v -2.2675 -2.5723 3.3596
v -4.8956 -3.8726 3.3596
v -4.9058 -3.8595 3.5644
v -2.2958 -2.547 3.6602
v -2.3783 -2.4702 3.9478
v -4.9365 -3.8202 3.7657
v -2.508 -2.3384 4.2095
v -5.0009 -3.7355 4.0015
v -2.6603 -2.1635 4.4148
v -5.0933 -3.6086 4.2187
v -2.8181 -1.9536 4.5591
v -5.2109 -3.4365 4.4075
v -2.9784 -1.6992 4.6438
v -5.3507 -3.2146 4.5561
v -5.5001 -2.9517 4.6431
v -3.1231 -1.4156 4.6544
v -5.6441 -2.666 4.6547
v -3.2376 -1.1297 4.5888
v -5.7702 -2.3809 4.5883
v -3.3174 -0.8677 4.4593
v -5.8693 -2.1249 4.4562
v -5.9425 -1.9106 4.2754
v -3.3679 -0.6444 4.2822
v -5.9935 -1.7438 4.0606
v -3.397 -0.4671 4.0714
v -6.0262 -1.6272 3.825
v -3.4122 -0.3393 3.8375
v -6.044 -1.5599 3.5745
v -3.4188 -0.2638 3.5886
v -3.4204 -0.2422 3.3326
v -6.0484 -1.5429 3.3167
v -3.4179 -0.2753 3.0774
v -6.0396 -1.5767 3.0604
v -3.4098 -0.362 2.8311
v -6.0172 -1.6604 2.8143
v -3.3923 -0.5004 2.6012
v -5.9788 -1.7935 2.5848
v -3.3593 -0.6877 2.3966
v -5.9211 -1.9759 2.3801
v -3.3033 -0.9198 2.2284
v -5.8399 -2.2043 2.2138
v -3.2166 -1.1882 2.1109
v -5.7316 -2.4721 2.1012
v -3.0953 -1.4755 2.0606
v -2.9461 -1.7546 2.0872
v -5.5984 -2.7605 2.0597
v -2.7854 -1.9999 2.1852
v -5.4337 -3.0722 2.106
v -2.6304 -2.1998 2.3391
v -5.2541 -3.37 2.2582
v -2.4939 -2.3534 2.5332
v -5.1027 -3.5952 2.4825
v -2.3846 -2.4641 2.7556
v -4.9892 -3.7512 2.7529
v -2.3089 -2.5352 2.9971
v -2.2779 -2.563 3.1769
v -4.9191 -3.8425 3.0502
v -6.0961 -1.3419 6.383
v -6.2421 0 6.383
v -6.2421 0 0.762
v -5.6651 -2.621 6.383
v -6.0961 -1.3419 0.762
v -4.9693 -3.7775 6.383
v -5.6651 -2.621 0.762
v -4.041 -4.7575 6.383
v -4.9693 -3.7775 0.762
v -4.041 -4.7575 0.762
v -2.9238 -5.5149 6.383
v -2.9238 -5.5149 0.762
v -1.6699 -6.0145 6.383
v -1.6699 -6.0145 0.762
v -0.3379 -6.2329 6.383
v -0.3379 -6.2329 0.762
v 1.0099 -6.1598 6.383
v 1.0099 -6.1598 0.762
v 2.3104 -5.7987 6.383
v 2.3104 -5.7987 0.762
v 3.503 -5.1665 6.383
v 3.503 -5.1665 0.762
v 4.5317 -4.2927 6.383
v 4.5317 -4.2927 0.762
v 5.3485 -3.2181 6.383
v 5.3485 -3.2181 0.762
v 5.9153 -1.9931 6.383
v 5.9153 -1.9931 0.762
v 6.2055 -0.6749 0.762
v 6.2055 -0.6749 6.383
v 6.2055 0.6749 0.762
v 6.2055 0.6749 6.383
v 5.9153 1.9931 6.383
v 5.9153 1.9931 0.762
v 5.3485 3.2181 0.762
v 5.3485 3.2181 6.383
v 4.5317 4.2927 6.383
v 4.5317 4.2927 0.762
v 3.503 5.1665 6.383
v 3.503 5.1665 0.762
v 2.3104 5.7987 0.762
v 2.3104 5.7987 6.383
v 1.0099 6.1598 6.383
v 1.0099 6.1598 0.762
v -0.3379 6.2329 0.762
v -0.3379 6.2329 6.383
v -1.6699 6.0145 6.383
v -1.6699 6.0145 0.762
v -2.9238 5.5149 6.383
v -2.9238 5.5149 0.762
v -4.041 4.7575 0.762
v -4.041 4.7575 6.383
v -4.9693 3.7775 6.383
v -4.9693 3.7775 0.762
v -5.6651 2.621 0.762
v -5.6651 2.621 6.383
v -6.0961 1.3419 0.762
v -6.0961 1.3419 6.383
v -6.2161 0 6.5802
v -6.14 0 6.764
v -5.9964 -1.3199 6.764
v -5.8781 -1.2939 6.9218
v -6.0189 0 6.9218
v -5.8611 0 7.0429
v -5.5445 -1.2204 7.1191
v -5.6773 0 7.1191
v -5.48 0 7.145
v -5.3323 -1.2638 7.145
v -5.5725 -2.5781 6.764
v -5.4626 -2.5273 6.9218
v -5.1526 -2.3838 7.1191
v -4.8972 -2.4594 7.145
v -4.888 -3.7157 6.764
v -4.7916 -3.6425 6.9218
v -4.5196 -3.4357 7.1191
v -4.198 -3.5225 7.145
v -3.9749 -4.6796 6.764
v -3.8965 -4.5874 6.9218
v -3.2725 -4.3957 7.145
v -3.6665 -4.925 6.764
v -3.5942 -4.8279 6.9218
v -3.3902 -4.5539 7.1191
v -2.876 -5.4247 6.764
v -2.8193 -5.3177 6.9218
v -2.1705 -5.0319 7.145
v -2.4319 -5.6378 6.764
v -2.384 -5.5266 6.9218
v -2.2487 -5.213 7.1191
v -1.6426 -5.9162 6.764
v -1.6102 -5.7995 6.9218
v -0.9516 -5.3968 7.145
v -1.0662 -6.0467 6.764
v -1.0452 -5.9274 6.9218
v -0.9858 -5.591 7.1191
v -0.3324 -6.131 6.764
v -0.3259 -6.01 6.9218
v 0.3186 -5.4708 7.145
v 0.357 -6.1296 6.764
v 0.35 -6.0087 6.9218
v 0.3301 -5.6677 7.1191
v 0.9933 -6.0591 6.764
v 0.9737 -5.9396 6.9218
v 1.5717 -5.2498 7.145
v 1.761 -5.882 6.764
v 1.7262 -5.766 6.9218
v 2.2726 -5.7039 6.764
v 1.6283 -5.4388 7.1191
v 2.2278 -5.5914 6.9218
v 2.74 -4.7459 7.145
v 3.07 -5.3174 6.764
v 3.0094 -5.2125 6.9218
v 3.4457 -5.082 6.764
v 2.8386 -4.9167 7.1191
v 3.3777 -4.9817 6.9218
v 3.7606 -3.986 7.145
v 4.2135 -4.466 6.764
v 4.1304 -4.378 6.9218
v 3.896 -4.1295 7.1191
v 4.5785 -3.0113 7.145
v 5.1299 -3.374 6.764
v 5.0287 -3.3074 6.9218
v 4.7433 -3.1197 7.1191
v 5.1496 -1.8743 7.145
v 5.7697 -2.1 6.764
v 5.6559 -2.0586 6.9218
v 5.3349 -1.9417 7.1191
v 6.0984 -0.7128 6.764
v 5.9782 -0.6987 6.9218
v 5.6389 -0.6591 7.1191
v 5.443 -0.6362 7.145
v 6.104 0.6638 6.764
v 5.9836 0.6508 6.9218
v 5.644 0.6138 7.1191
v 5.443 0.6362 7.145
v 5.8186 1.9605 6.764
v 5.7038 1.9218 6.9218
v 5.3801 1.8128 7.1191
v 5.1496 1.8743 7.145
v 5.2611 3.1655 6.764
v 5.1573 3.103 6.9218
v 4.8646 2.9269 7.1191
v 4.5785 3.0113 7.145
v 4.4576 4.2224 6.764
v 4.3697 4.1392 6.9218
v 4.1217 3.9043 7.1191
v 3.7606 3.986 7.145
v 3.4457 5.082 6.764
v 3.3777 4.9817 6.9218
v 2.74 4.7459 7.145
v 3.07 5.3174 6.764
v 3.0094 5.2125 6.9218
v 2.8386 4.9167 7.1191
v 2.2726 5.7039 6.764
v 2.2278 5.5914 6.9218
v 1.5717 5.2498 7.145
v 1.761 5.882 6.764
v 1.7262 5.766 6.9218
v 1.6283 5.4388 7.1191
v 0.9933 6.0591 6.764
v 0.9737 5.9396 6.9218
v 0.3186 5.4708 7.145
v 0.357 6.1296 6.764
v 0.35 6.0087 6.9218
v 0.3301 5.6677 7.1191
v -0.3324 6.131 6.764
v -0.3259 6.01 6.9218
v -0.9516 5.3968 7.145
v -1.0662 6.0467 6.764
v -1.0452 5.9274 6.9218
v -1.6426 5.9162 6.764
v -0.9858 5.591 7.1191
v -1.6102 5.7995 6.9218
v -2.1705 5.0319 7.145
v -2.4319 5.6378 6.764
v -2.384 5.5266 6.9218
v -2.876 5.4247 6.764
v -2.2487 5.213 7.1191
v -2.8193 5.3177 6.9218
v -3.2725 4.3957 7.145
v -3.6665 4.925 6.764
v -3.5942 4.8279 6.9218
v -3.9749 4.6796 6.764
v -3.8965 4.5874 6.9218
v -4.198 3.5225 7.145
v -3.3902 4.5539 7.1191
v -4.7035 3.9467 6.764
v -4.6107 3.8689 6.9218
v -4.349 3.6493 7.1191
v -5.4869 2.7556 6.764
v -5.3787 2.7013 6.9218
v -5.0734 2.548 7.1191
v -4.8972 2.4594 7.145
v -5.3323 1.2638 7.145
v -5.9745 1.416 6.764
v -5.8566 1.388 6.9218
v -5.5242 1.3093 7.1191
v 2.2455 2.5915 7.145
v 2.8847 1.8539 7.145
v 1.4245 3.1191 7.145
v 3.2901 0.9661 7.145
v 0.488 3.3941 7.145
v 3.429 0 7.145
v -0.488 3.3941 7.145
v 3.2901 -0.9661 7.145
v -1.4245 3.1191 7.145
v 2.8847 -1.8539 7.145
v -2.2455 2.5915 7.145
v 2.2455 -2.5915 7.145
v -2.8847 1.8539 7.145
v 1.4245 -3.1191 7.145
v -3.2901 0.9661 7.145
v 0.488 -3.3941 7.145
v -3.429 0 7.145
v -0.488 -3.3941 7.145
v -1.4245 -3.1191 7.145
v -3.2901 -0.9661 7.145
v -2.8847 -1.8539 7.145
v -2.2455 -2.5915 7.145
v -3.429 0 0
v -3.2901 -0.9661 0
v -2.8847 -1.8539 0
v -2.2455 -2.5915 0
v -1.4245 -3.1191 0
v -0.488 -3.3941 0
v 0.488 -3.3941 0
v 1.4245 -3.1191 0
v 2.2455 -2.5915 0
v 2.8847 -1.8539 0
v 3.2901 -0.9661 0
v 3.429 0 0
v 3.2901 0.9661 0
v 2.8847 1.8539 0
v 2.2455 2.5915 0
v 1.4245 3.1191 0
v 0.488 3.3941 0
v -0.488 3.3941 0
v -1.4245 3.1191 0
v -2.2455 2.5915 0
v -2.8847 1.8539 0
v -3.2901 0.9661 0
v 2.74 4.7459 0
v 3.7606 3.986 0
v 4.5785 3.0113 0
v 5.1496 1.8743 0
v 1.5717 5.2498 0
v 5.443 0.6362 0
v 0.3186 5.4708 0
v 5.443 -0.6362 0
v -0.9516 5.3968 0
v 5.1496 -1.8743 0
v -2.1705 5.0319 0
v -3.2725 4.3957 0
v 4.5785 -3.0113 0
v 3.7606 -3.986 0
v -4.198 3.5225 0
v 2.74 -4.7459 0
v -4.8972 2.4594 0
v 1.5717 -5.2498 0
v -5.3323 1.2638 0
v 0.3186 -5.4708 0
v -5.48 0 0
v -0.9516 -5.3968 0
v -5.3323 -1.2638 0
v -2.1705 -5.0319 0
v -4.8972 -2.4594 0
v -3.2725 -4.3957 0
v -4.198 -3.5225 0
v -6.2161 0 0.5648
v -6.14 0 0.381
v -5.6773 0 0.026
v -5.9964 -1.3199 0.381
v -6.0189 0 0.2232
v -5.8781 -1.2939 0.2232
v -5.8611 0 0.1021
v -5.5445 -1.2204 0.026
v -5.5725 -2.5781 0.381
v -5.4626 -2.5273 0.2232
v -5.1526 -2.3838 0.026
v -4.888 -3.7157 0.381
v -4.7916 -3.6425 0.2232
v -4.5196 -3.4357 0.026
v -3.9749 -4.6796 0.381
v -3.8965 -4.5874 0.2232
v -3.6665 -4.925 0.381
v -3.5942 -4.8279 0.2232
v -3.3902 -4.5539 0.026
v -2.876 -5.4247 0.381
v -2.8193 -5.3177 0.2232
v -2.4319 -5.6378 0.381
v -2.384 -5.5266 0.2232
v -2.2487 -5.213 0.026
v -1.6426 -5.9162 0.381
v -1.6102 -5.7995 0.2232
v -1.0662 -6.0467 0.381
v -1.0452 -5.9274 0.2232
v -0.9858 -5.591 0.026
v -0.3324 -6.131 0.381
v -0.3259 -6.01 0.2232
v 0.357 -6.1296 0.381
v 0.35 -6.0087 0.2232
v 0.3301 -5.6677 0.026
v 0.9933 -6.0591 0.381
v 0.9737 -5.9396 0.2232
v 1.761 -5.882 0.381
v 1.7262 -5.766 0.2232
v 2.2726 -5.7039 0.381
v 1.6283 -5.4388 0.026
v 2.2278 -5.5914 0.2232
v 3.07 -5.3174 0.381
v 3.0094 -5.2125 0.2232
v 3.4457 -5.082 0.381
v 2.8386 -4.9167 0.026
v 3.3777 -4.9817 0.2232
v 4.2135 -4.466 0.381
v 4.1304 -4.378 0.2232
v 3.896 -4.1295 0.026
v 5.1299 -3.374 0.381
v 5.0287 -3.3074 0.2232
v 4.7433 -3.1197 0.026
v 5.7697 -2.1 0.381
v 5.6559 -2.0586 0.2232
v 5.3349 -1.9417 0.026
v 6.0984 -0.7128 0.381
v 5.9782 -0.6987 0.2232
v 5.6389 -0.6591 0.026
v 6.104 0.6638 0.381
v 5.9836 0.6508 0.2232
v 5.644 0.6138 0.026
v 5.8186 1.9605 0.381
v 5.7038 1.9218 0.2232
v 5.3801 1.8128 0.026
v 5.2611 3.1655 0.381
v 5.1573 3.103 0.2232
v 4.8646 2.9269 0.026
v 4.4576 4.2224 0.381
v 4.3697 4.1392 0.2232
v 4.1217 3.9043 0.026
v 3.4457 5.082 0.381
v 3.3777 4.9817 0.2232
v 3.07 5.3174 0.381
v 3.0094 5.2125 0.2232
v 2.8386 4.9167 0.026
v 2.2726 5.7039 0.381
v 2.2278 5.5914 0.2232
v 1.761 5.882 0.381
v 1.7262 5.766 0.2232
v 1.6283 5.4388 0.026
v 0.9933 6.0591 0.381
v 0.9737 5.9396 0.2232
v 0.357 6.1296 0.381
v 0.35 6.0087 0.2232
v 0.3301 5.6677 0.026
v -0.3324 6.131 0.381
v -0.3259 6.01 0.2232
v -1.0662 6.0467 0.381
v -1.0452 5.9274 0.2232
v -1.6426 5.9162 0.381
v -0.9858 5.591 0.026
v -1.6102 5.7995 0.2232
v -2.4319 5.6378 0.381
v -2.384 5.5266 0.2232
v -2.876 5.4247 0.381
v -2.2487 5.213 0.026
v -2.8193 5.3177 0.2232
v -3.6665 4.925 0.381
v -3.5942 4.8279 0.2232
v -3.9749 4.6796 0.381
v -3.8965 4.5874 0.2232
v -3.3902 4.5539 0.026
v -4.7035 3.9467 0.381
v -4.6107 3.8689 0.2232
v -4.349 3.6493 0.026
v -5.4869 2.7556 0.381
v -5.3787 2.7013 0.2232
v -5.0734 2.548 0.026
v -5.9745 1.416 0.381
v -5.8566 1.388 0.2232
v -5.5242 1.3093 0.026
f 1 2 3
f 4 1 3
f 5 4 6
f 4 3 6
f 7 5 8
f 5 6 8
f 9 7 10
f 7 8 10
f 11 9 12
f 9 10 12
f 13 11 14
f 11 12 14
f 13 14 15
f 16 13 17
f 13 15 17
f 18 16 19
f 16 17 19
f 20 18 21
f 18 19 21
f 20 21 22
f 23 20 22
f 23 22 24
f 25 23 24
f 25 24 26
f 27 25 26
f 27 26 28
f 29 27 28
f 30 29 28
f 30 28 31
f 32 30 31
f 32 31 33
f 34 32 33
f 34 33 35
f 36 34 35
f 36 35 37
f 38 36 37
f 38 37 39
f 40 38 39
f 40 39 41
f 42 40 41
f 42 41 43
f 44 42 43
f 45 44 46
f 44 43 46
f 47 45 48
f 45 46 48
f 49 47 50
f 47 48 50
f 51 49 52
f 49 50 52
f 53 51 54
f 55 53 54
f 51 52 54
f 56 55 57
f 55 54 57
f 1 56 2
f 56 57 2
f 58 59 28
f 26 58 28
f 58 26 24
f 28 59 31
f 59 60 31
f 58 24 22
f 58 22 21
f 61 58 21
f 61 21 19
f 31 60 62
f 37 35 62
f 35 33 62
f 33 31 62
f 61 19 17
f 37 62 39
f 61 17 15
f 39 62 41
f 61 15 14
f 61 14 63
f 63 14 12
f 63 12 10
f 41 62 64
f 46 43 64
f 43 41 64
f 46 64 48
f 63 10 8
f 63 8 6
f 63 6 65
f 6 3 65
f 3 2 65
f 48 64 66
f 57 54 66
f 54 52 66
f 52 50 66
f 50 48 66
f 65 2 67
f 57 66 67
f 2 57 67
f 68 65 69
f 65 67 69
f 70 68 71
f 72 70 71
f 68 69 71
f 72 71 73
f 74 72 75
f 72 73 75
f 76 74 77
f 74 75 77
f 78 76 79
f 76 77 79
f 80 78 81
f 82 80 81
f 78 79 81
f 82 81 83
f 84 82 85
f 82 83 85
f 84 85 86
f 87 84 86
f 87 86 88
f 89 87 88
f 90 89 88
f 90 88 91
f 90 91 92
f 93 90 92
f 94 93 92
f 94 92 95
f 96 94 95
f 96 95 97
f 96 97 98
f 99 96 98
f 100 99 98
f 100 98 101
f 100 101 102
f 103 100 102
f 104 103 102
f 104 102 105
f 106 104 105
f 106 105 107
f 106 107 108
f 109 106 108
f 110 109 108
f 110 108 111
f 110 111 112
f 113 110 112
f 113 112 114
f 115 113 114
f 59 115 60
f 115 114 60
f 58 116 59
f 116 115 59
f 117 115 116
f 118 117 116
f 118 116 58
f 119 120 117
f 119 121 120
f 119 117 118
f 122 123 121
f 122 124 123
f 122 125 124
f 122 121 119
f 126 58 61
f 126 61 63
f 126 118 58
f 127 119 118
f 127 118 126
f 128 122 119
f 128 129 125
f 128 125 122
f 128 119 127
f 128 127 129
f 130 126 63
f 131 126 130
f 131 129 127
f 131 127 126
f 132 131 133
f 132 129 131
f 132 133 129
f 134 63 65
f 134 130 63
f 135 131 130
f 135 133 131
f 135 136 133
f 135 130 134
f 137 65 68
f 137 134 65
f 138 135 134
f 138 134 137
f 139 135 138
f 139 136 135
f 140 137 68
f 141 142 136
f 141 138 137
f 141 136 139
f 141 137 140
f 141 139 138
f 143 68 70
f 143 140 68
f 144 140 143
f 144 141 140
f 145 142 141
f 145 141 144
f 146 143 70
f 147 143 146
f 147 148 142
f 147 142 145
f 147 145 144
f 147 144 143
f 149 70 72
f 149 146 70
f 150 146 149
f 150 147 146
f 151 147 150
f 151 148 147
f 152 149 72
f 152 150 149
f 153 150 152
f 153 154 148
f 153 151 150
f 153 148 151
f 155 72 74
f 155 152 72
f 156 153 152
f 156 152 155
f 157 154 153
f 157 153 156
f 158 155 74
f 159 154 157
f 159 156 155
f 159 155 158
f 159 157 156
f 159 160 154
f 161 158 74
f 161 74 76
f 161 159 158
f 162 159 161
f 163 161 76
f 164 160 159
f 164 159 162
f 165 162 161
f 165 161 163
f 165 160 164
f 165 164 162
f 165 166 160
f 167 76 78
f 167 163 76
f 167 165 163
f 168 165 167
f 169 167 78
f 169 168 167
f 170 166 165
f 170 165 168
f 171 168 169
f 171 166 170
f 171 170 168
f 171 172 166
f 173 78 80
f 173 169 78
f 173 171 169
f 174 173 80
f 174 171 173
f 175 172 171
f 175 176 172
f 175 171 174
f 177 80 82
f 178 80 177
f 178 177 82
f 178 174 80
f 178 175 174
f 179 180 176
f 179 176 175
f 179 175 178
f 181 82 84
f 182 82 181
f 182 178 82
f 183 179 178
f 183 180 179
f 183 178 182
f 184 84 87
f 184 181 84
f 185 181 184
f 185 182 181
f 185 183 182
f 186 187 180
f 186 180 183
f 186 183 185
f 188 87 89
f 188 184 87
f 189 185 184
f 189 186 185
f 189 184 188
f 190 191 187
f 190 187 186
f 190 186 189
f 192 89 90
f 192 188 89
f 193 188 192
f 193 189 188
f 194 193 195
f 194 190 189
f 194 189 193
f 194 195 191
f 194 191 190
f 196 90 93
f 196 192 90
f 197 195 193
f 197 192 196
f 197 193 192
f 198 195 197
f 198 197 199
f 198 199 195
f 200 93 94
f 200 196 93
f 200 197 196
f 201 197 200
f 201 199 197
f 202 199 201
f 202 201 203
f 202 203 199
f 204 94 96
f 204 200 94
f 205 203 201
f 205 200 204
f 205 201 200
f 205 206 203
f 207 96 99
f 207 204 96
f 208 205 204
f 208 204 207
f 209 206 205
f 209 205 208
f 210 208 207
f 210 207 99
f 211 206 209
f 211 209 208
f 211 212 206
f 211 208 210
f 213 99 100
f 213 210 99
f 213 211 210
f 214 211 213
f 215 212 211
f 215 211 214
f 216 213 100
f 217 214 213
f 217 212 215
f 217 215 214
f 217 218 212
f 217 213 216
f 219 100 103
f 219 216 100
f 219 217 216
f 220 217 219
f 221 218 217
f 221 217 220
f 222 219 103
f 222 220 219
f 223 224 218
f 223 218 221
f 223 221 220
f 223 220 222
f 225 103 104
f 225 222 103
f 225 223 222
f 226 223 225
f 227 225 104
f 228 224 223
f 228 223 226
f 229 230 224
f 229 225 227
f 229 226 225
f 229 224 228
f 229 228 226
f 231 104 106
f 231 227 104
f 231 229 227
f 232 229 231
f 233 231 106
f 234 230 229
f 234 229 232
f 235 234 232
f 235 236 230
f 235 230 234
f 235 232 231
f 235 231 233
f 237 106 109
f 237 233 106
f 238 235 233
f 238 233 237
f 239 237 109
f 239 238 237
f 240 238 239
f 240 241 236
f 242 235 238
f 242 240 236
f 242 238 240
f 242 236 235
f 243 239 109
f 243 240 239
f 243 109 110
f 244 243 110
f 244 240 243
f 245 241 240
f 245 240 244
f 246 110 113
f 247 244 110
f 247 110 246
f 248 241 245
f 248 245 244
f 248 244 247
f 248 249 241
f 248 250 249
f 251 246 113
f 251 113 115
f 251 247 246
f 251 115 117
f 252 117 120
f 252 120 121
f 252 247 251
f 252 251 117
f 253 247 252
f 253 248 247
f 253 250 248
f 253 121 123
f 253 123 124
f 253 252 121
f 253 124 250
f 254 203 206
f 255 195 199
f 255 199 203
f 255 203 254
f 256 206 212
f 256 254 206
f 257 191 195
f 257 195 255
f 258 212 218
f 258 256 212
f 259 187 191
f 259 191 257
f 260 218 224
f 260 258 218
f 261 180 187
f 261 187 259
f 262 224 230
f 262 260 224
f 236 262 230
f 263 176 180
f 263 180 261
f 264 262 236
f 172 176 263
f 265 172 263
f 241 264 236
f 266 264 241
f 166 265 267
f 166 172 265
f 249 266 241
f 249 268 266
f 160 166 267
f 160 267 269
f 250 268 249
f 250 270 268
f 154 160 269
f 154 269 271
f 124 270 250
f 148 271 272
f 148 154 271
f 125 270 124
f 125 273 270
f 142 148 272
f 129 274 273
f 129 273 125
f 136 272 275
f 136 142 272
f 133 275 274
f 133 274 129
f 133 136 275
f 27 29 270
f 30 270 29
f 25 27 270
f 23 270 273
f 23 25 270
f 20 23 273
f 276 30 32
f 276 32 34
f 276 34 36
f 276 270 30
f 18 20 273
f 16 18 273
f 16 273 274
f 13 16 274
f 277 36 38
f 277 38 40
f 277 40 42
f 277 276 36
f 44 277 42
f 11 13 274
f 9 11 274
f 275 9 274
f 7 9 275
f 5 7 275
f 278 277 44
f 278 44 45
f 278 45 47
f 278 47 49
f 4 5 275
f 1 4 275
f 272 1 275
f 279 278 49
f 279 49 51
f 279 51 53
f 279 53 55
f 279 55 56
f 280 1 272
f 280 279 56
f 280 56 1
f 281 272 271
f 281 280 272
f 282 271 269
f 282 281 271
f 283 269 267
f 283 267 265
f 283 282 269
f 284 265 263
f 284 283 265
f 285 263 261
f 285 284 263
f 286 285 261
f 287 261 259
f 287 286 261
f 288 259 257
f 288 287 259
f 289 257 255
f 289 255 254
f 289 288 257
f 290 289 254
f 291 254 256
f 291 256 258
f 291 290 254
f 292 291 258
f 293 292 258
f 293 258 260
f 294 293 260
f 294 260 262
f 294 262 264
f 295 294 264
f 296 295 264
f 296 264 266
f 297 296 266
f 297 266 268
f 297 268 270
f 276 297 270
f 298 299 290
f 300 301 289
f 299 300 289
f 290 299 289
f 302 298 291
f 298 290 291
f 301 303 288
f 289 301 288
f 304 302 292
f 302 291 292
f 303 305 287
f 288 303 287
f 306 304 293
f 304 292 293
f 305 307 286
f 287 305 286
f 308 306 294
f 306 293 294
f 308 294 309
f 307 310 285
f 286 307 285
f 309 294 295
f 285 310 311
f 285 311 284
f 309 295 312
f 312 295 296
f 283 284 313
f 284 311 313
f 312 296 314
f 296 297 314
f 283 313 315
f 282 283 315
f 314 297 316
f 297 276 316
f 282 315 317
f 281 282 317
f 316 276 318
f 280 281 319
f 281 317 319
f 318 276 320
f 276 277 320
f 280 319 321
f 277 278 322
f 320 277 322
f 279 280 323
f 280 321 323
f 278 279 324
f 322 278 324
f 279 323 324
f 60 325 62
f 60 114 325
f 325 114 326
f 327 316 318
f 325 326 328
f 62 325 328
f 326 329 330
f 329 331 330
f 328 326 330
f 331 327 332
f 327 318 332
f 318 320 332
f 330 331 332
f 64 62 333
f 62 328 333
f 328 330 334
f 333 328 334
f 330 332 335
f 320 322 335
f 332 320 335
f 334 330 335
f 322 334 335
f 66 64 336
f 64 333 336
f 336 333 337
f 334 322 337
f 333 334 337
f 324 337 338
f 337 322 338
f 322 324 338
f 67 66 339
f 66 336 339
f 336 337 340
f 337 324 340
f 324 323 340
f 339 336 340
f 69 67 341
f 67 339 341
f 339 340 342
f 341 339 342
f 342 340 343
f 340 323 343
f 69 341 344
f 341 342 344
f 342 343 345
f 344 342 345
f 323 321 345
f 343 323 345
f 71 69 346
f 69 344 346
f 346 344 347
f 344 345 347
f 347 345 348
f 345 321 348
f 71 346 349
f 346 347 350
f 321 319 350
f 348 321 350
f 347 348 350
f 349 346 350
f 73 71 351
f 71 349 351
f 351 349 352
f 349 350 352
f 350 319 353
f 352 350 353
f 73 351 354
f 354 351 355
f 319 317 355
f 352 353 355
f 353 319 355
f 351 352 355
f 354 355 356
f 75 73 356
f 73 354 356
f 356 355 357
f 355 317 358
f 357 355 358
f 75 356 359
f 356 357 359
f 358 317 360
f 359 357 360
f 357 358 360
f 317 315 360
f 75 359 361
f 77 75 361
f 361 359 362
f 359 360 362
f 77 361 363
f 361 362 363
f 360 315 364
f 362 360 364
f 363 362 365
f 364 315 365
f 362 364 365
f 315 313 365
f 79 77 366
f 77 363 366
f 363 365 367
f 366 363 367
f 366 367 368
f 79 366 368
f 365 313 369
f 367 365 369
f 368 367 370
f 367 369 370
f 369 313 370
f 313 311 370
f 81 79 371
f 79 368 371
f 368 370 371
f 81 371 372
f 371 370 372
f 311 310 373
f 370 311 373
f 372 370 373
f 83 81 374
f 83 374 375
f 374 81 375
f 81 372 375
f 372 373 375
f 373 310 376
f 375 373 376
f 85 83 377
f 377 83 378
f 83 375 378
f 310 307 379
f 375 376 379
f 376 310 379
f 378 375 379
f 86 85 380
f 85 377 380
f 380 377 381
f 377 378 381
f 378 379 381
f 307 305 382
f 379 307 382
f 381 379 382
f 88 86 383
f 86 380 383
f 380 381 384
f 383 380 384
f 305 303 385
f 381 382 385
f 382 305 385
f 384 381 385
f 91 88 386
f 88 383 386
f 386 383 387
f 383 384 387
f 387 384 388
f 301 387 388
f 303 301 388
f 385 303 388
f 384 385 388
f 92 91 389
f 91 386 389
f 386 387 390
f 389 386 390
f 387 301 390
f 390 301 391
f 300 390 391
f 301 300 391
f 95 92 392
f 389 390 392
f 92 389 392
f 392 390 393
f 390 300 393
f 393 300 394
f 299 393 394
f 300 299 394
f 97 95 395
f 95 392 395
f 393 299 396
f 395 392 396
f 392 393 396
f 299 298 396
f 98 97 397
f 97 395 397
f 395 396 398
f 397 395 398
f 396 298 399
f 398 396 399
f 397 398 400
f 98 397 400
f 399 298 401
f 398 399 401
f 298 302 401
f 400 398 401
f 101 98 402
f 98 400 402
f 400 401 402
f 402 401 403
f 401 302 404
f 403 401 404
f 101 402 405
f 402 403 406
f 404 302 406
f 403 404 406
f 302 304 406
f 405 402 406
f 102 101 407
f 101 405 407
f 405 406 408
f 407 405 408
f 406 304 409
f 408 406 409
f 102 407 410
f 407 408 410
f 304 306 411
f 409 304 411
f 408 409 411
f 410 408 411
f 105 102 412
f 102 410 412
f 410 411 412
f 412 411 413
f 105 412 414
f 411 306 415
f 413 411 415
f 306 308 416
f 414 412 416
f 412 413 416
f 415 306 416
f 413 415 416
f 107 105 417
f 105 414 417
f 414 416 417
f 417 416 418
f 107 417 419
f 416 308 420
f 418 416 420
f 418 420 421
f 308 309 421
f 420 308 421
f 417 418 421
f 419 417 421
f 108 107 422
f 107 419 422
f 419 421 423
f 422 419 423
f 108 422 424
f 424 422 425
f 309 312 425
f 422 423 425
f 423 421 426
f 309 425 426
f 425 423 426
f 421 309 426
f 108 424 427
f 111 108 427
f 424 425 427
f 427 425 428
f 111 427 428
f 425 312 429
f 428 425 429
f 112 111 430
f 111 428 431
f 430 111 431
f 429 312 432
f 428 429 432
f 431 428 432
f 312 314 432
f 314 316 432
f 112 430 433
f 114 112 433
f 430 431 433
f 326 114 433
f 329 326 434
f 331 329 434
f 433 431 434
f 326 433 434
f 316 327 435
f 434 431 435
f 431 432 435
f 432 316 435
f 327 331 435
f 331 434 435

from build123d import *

# Parameters (mm, degrees)
ESQUISSE1_R           = 6.24205
ESQUISSE1_R_2         = 3.429
BOSS_EXTRU_1_DEPTH    = 7.14502
CONG_1_R              = 0.762
D_GAGEMENT_M21_REACH  = 17.35
D_GAGEMENT_M21_BORE_R = 1.3


with BuildPart() as part:
    # Esquisse1 → Boss.-Extru.1 (new body)
    with BuildSketch(Plane.XY):
        with Locations(Location((0, 0, 0), (0, 0, 180))):
            Circle(ESQUISSE1_R)
        with Locations(Location((0, 0, 0), (0, 0, 180))):
            Circle(ESQUISSE1_R_2, mode=Mode.SUBTRACT)
    extrude(amount=BOSS_EXTRU_1_DEPTH)

    # Congé1
    cong_1_edges = [part.edges().sort_by_distance(p)[0] for p in [
        (6.24205, 0, 0),
        (6.24205, 0, 7.14502),
    ]]
    fillet(cong_1_edges, radius=CONG_1_R)

    # Dégagement M21 bore (on position points) → Dégagement M21 (cut, up to next)
    with BuildSketch(Plane(origin=(-5.594728997, -2.768067132, 3.359647544), x_dir=(0.44345481566, -0.896296729029, 0), z_dir=(-0.896296729029, -0.44345481566, 0)), mode=Mode.PRIVATE) as d_gagement_m21_sk1:
        Circle(D_GAGEMENT_M21_BORE_R)
    d_gagement_m21_tool1 = extrude(d_gagement_m21_sk1.sketch, amount=-D_GAGEMENT_M21_REACH, mode=Mode.PRIVATE) & part.part
    add(d_gagement_m21_tool1.solids().sort_by_distance((-5.594729, -2.768067, 3.359648))[0], mode=Mode.SUBTRACT)


solid = part.part
